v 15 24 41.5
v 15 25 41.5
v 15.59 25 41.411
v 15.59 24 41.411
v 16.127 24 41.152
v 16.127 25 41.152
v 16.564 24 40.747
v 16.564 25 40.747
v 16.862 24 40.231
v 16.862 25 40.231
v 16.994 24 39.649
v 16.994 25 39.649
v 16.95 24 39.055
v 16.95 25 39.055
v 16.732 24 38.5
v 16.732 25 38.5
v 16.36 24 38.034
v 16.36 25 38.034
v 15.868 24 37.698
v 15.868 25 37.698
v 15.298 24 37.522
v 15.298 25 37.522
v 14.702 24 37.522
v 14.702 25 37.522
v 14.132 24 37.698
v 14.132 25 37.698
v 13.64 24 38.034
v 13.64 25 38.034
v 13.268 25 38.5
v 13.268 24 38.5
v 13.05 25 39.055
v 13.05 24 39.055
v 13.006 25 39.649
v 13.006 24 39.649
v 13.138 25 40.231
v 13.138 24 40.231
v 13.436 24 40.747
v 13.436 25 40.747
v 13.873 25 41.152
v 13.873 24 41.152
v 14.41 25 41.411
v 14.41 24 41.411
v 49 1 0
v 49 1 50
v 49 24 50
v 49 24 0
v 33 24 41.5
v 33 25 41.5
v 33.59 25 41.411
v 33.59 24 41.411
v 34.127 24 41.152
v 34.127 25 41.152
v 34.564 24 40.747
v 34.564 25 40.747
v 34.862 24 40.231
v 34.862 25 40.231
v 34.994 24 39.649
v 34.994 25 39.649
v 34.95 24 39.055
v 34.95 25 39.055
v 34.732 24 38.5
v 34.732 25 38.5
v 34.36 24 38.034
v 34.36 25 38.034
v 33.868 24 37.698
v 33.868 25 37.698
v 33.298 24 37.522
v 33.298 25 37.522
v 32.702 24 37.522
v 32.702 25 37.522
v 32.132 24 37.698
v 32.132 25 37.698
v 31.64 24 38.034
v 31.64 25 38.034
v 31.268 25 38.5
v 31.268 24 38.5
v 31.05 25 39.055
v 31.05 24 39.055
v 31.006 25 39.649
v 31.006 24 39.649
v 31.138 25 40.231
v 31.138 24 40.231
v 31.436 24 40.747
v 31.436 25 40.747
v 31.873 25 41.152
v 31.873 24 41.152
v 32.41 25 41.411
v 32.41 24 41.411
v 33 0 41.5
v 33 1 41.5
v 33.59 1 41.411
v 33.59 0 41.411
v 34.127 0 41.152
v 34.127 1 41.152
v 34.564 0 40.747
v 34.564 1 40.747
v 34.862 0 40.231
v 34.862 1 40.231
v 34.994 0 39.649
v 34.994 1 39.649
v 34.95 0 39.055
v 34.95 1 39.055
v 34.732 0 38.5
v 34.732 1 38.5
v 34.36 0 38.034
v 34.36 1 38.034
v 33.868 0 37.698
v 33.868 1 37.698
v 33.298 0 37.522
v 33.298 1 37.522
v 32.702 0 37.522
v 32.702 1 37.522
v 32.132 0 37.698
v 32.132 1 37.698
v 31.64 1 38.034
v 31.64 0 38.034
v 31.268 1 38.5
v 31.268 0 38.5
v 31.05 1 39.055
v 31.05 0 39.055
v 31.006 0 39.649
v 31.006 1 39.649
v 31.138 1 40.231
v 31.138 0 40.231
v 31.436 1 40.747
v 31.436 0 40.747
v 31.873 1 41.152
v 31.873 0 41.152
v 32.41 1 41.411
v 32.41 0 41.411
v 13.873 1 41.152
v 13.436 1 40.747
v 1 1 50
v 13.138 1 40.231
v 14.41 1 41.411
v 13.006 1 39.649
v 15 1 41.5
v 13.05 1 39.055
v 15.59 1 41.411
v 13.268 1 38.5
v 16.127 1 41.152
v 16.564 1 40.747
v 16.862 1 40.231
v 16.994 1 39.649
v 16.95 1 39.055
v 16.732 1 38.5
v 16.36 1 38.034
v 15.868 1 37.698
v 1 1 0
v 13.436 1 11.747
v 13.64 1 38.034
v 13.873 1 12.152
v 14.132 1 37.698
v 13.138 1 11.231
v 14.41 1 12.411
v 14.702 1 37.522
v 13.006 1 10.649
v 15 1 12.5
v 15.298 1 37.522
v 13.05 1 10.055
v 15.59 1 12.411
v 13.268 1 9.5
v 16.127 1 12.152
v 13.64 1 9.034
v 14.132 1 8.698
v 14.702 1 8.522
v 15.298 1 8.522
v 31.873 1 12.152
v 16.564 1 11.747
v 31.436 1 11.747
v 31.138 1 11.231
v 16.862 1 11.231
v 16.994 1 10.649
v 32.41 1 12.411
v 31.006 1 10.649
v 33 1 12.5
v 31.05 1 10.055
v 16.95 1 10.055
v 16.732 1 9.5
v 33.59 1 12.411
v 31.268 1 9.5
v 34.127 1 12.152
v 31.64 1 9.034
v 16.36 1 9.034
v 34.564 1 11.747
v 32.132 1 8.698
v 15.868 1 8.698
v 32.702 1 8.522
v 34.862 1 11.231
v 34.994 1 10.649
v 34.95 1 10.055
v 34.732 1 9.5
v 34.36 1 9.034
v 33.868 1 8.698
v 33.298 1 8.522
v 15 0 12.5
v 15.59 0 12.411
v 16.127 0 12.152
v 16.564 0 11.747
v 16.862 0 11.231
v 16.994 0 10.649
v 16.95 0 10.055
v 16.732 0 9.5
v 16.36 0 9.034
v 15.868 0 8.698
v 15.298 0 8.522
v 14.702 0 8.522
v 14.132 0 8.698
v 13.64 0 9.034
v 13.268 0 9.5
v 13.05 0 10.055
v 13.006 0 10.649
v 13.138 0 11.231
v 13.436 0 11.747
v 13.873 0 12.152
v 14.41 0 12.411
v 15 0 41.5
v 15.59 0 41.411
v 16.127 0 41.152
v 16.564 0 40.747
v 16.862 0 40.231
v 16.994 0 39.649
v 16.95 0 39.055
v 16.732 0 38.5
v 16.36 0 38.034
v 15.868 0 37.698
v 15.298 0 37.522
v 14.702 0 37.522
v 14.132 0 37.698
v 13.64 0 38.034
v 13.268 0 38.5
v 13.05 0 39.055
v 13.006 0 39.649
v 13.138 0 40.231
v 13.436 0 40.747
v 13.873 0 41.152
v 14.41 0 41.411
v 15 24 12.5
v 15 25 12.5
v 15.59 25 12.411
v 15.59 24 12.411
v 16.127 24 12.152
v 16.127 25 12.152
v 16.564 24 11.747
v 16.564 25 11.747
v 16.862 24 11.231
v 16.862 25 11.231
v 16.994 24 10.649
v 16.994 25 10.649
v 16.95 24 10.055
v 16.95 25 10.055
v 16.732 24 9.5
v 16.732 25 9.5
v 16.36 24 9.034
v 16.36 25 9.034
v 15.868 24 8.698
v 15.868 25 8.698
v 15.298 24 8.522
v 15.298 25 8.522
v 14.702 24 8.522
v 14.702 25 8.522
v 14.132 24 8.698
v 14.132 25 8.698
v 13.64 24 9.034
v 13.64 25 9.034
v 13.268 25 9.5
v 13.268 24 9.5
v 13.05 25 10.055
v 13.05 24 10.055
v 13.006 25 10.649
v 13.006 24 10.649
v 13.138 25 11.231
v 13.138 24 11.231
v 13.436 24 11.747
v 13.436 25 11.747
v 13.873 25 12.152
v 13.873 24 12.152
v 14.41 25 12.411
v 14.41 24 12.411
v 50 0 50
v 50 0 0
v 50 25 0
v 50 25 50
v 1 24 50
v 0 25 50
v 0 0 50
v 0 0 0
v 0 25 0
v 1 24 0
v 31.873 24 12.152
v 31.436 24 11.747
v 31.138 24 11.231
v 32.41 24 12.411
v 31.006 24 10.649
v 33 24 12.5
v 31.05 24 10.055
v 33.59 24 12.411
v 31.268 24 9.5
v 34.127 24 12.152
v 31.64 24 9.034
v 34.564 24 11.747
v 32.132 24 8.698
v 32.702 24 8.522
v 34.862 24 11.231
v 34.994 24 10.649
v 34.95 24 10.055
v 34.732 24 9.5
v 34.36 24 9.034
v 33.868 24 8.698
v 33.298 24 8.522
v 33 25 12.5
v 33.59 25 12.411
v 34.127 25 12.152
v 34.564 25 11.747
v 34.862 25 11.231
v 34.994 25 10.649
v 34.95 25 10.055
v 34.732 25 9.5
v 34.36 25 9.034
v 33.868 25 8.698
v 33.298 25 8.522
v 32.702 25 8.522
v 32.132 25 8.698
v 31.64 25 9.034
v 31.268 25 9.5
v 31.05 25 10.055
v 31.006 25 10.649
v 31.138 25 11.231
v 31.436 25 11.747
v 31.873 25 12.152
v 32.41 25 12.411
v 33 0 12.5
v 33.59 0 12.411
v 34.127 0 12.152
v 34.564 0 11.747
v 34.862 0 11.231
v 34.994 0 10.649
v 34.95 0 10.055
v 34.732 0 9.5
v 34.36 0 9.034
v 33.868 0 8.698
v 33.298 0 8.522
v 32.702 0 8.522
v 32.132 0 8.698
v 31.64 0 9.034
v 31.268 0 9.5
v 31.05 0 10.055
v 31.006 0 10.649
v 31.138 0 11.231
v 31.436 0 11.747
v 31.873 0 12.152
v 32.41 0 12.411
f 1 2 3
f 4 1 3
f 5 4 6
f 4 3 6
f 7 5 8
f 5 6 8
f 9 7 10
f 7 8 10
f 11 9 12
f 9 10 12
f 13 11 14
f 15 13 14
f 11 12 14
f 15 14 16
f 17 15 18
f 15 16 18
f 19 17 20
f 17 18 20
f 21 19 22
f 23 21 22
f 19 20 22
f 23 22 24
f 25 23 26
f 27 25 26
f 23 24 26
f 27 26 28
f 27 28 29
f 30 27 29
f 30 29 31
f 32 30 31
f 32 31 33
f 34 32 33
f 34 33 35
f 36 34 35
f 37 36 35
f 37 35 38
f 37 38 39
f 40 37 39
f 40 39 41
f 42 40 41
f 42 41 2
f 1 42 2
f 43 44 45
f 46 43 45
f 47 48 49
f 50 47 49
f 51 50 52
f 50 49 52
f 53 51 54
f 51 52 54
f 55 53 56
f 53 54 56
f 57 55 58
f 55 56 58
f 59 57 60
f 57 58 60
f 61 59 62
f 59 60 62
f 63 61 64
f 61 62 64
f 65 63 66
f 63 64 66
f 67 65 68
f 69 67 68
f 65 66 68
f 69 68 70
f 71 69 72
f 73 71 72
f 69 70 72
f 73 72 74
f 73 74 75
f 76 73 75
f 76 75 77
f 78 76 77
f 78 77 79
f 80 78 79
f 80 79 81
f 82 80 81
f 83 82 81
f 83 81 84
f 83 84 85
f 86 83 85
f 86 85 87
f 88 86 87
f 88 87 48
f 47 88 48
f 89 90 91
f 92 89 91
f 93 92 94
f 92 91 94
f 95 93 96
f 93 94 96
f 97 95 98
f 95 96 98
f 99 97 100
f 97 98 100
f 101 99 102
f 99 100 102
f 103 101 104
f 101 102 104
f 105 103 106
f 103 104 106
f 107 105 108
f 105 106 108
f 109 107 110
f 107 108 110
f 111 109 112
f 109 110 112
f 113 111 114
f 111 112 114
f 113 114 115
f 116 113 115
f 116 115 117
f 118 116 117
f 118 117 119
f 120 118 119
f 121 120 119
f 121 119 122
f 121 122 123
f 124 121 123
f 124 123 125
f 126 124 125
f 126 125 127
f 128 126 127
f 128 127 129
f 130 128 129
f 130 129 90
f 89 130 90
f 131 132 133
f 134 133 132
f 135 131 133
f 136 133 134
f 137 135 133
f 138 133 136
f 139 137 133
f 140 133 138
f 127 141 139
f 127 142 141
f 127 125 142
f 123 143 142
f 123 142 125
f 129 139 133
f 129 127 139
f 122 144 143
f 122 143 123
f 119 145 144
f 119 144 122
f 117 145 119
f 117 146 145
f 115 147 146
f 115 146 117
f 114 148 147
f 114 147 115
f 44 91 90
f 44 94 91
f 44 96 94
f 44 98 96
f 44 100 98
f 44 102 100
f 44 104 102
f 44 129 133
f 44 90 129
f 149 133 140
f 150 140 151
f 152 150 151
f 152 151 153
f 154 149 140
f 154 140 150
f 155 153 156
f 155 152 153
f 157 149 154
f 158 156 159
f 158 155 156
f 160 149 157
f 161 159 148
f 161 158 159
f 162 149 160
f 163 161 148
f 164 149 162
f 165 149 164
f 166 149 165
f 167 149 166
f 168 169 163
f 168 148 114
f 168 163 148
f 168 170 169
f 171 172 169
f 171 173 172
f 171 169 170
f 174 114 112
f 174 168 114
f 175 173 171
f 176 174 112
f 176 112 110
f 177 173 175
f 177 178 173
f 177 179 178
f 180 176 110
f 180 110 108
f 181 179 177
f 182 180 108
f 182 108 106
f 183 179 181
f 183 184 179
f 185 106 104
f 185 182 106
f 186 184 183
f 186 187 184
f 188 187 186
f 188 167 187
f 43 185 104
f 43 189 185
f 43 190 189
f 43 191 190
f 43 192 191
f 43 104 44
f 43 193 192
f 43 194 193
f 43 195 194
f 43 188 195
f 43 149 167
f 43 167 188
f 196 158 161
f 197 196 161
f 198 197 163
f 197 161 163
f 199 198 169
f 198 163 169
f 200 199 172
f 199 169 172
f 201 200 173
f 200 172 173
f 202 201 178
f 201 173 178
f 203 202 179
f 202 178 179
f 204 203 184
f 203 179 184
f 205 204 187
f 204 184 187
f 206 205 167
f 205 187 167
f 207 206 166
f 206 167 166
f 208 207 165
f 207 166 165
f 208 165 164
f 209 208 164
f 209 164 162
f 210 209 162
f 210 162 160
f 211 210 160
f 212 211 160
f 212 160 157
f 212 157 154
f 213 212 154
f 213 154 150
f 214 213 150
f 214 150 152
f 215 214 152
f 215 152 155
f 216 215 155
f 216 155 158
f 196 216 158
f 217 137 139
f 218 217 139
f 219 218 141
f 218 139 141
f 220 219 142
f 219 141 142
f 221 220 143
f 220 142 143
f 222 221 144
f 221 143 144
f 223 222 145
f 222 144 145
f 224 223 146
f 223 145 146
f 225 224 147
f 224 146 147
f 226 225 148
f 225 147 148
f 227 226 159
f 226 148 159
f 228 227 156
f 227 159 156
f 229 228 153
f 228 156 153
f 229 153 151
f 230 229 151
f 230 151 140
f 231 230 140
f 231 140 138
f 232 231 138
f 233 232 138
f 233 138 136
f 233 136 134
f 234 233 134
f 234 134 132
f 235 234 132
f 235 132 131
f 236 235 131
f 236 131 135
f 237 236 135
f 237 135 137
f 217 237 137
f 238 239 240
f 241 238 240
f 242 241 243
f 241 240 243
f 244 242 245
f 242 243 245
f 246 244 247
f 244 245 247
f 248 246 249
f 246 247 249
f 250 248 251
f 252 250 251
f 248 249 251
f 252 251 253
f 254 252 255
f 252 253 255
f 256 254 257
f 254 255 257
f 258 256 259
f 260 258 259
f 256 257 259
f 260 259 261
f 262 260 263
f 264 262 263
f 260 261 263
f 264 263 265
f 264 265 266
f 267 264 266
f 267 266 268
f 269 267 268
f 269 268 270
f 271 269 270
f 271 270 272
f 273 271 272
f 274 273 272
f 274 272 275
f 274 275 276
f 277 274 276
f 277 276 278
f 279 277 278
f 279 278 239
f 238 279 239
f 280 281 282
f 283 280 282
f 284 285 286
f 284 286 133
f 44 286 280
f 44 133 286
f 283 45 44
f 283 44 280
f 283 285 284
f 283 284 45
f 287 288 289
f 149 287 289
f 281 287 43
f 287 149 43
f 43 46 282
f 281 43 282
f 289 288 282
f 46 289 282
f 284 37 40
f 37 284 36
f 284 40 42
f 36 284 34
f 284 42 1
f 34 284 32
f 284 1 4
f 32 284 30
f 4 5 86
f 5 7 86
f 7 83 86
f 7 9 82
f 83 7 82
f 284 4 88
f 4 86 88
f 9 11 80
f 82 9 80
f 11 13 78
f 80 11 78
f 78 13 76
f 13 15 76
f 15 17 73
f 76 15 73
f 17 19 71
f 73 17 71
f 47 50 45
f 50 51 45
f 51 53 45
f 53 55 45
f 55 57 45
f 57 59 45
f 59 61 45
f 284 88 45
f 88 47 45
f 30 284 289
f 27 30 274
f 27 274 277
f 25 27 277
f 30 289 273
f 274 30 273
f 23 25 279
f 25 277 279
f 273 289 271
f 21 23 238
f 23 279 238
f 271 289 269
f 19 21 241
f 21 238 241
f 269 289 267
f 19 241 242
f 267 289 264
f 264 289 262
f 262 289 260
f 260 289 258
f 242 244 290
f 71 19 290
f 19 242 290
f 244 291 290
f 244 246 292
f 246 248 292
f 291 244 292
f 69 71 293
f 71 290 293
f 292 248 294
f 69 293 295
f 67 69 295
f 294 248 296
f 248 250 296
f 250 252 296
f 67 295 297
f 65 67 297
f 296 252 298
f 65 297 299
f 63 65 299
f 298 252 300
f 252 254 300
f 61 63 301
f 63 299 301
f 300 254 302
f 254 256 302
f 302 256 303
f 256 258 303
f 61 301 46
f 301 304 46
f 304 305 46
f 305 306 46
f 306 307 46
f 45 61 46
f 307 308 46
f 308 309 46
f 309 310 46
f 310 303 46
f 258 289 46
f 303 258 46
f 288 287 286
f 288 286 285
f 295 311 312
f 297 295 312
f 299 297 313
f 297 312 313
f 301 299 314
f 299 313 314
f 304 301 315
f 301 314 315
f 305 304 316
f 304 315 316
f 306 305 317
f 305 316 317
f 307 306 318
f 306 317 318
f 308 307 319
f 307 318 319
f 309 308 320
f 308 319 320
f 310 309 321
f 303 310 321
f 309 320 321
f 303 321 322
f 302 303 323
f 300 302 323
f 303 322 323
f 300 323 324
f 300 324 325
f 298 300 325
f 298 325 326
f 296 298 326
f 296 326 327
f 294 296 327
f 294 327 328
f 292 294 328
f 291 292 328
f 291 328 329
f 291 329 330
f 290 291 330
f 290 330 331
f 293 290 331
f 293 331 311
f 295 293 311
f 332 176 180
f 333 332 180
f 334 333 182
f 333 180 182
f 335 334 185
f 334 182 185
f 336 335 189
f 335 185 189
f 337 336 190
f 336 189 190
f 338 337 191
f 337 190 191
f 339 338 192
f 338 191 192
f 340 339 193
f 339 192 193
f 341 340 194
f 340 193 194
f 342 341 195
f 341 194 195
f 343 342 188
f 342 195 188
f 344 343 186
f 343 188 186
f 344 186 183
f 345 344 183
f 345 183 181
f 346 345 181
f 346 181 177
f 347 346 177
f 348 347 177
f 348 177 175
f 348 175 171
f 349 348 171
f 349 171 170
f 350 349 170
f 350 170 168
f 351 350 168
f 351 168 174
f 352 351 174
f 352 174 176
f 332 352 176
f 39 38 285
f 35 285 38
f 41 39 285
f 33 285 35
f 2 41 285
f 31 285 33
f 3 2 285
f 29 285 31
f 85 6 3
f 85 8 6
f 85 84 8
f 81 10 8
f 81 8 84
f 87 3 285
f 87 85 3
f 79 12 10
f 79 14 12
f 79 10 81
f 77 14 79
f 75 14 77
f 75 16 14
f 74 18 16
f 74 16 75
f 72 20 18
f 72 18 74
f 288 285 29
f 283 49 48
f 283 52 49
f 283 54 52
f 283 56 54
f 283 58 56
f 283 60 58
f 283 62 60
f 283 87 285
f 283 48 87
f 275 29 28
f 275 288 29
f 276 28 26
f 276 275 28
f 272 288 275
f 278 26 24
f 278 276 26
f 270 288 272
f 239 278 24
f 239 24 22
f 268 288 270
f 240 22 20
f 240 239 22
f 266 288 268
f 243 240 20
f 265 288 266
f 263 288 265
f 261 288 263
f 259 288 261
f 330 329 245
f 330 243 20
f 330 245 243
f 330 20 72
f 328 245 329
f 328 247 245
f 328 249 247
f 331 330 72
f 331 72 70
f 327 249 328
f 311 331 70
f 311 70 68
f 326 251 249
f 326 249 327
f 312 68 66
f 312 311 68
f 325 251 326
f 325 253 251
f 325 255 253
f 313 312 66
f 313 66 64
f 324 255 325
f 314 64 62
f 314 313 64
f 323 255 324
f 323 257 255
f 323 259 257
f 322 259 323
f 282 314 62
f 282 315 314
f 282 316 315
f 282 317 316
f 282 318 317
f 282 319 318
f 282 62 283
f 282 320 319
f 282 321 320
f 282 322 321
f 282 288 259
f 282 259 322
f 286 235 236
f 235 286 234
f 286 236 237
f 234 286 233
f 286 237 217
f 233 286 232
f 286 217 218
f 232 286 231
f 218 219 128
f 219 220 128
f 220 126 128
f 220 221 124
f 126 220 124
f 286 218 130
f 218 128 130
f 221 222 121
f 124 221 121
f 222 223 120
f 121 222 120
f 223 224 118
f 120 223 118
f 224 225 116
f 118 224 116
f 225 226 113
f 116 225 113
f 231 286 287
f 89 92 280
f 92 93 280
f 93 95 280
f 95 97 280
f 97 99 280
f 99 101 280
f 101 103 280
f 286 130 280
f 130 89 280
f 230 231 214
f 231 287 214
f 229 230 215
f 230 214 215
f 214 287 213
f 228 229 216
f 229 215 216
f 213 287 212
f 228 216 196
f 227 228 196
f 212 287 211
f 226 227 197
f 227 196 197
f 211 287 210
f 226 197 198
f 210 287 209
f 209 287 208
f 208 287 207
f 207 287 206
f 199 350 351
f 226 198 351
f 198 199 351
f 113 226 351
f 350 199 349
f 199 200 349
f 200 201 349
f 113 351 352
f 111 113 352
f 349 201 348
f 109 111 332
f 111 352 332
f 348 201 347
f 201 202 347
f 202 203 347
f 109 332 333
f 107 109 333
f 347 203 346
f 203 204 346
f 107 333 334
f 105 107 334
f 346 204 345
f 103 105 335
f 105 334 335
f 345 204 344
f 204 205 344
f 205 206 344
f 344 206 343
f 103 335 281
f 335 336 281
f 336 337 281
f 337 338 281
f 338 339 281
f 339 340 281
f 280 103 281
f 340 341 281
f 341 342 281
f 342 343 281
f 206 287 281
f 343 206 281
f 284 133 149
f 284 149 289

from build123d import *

# Parameters (mm, degrees)
SKETCH_1_W          = 50
SKETCH_1_H          = 25
SKETCH_1_W_2        = 48
SKETCH_1_H_2        = 23
EXTRUDE_1_DEPTH     = 50
SKETCH_2_R          = 2
CUT_EXTRUDE_1_DEPTH = 50


with BuildPart() as part:
    # 草图1 → 凸台-拉伸1 (new body)
    with BuildSketch(Plane.XY):
        with Locations((25, 12.5)):
            Rectangle(SKETCH_1_W, SKETCH_1_H)
        with Locations((25, 12.5)):
            Rectangle(SKETCH_1_W_2, SKETCH_1_H_2, mode=Mode.SUBTRACT)
    extrude(amount=EXTRUDE_1_DEPTH)

    # 草图2 → 切除-拉伸1 (cut)
    with BuildSketch(Plane(origin=(0, 25, 0), x_dir=(1, 0, 0), z_dir=(0, 1, 0))):
        with Locations(Location((15, -10.5, 0), (0, 0, 270))):
            Circle(SKETCH_2_R)
        with Locations(Location((33, -10.5, 0), (0, 0, 270))):
            Circle(SKETCH_2_R)
        with Locations(Location((33, -39.5, 0), (0, 0, 270))):
            Circle(SKETCH_2_R)
        with Locations(Location((15, -39.5, 0), (0, 0, 270))):
            Circle(SKETCH_2_R)
    extrude(amount=-CUT_EXTRUDE_1_DEPTH, mode=Mode.SUBTRACT)


solid = part.part
